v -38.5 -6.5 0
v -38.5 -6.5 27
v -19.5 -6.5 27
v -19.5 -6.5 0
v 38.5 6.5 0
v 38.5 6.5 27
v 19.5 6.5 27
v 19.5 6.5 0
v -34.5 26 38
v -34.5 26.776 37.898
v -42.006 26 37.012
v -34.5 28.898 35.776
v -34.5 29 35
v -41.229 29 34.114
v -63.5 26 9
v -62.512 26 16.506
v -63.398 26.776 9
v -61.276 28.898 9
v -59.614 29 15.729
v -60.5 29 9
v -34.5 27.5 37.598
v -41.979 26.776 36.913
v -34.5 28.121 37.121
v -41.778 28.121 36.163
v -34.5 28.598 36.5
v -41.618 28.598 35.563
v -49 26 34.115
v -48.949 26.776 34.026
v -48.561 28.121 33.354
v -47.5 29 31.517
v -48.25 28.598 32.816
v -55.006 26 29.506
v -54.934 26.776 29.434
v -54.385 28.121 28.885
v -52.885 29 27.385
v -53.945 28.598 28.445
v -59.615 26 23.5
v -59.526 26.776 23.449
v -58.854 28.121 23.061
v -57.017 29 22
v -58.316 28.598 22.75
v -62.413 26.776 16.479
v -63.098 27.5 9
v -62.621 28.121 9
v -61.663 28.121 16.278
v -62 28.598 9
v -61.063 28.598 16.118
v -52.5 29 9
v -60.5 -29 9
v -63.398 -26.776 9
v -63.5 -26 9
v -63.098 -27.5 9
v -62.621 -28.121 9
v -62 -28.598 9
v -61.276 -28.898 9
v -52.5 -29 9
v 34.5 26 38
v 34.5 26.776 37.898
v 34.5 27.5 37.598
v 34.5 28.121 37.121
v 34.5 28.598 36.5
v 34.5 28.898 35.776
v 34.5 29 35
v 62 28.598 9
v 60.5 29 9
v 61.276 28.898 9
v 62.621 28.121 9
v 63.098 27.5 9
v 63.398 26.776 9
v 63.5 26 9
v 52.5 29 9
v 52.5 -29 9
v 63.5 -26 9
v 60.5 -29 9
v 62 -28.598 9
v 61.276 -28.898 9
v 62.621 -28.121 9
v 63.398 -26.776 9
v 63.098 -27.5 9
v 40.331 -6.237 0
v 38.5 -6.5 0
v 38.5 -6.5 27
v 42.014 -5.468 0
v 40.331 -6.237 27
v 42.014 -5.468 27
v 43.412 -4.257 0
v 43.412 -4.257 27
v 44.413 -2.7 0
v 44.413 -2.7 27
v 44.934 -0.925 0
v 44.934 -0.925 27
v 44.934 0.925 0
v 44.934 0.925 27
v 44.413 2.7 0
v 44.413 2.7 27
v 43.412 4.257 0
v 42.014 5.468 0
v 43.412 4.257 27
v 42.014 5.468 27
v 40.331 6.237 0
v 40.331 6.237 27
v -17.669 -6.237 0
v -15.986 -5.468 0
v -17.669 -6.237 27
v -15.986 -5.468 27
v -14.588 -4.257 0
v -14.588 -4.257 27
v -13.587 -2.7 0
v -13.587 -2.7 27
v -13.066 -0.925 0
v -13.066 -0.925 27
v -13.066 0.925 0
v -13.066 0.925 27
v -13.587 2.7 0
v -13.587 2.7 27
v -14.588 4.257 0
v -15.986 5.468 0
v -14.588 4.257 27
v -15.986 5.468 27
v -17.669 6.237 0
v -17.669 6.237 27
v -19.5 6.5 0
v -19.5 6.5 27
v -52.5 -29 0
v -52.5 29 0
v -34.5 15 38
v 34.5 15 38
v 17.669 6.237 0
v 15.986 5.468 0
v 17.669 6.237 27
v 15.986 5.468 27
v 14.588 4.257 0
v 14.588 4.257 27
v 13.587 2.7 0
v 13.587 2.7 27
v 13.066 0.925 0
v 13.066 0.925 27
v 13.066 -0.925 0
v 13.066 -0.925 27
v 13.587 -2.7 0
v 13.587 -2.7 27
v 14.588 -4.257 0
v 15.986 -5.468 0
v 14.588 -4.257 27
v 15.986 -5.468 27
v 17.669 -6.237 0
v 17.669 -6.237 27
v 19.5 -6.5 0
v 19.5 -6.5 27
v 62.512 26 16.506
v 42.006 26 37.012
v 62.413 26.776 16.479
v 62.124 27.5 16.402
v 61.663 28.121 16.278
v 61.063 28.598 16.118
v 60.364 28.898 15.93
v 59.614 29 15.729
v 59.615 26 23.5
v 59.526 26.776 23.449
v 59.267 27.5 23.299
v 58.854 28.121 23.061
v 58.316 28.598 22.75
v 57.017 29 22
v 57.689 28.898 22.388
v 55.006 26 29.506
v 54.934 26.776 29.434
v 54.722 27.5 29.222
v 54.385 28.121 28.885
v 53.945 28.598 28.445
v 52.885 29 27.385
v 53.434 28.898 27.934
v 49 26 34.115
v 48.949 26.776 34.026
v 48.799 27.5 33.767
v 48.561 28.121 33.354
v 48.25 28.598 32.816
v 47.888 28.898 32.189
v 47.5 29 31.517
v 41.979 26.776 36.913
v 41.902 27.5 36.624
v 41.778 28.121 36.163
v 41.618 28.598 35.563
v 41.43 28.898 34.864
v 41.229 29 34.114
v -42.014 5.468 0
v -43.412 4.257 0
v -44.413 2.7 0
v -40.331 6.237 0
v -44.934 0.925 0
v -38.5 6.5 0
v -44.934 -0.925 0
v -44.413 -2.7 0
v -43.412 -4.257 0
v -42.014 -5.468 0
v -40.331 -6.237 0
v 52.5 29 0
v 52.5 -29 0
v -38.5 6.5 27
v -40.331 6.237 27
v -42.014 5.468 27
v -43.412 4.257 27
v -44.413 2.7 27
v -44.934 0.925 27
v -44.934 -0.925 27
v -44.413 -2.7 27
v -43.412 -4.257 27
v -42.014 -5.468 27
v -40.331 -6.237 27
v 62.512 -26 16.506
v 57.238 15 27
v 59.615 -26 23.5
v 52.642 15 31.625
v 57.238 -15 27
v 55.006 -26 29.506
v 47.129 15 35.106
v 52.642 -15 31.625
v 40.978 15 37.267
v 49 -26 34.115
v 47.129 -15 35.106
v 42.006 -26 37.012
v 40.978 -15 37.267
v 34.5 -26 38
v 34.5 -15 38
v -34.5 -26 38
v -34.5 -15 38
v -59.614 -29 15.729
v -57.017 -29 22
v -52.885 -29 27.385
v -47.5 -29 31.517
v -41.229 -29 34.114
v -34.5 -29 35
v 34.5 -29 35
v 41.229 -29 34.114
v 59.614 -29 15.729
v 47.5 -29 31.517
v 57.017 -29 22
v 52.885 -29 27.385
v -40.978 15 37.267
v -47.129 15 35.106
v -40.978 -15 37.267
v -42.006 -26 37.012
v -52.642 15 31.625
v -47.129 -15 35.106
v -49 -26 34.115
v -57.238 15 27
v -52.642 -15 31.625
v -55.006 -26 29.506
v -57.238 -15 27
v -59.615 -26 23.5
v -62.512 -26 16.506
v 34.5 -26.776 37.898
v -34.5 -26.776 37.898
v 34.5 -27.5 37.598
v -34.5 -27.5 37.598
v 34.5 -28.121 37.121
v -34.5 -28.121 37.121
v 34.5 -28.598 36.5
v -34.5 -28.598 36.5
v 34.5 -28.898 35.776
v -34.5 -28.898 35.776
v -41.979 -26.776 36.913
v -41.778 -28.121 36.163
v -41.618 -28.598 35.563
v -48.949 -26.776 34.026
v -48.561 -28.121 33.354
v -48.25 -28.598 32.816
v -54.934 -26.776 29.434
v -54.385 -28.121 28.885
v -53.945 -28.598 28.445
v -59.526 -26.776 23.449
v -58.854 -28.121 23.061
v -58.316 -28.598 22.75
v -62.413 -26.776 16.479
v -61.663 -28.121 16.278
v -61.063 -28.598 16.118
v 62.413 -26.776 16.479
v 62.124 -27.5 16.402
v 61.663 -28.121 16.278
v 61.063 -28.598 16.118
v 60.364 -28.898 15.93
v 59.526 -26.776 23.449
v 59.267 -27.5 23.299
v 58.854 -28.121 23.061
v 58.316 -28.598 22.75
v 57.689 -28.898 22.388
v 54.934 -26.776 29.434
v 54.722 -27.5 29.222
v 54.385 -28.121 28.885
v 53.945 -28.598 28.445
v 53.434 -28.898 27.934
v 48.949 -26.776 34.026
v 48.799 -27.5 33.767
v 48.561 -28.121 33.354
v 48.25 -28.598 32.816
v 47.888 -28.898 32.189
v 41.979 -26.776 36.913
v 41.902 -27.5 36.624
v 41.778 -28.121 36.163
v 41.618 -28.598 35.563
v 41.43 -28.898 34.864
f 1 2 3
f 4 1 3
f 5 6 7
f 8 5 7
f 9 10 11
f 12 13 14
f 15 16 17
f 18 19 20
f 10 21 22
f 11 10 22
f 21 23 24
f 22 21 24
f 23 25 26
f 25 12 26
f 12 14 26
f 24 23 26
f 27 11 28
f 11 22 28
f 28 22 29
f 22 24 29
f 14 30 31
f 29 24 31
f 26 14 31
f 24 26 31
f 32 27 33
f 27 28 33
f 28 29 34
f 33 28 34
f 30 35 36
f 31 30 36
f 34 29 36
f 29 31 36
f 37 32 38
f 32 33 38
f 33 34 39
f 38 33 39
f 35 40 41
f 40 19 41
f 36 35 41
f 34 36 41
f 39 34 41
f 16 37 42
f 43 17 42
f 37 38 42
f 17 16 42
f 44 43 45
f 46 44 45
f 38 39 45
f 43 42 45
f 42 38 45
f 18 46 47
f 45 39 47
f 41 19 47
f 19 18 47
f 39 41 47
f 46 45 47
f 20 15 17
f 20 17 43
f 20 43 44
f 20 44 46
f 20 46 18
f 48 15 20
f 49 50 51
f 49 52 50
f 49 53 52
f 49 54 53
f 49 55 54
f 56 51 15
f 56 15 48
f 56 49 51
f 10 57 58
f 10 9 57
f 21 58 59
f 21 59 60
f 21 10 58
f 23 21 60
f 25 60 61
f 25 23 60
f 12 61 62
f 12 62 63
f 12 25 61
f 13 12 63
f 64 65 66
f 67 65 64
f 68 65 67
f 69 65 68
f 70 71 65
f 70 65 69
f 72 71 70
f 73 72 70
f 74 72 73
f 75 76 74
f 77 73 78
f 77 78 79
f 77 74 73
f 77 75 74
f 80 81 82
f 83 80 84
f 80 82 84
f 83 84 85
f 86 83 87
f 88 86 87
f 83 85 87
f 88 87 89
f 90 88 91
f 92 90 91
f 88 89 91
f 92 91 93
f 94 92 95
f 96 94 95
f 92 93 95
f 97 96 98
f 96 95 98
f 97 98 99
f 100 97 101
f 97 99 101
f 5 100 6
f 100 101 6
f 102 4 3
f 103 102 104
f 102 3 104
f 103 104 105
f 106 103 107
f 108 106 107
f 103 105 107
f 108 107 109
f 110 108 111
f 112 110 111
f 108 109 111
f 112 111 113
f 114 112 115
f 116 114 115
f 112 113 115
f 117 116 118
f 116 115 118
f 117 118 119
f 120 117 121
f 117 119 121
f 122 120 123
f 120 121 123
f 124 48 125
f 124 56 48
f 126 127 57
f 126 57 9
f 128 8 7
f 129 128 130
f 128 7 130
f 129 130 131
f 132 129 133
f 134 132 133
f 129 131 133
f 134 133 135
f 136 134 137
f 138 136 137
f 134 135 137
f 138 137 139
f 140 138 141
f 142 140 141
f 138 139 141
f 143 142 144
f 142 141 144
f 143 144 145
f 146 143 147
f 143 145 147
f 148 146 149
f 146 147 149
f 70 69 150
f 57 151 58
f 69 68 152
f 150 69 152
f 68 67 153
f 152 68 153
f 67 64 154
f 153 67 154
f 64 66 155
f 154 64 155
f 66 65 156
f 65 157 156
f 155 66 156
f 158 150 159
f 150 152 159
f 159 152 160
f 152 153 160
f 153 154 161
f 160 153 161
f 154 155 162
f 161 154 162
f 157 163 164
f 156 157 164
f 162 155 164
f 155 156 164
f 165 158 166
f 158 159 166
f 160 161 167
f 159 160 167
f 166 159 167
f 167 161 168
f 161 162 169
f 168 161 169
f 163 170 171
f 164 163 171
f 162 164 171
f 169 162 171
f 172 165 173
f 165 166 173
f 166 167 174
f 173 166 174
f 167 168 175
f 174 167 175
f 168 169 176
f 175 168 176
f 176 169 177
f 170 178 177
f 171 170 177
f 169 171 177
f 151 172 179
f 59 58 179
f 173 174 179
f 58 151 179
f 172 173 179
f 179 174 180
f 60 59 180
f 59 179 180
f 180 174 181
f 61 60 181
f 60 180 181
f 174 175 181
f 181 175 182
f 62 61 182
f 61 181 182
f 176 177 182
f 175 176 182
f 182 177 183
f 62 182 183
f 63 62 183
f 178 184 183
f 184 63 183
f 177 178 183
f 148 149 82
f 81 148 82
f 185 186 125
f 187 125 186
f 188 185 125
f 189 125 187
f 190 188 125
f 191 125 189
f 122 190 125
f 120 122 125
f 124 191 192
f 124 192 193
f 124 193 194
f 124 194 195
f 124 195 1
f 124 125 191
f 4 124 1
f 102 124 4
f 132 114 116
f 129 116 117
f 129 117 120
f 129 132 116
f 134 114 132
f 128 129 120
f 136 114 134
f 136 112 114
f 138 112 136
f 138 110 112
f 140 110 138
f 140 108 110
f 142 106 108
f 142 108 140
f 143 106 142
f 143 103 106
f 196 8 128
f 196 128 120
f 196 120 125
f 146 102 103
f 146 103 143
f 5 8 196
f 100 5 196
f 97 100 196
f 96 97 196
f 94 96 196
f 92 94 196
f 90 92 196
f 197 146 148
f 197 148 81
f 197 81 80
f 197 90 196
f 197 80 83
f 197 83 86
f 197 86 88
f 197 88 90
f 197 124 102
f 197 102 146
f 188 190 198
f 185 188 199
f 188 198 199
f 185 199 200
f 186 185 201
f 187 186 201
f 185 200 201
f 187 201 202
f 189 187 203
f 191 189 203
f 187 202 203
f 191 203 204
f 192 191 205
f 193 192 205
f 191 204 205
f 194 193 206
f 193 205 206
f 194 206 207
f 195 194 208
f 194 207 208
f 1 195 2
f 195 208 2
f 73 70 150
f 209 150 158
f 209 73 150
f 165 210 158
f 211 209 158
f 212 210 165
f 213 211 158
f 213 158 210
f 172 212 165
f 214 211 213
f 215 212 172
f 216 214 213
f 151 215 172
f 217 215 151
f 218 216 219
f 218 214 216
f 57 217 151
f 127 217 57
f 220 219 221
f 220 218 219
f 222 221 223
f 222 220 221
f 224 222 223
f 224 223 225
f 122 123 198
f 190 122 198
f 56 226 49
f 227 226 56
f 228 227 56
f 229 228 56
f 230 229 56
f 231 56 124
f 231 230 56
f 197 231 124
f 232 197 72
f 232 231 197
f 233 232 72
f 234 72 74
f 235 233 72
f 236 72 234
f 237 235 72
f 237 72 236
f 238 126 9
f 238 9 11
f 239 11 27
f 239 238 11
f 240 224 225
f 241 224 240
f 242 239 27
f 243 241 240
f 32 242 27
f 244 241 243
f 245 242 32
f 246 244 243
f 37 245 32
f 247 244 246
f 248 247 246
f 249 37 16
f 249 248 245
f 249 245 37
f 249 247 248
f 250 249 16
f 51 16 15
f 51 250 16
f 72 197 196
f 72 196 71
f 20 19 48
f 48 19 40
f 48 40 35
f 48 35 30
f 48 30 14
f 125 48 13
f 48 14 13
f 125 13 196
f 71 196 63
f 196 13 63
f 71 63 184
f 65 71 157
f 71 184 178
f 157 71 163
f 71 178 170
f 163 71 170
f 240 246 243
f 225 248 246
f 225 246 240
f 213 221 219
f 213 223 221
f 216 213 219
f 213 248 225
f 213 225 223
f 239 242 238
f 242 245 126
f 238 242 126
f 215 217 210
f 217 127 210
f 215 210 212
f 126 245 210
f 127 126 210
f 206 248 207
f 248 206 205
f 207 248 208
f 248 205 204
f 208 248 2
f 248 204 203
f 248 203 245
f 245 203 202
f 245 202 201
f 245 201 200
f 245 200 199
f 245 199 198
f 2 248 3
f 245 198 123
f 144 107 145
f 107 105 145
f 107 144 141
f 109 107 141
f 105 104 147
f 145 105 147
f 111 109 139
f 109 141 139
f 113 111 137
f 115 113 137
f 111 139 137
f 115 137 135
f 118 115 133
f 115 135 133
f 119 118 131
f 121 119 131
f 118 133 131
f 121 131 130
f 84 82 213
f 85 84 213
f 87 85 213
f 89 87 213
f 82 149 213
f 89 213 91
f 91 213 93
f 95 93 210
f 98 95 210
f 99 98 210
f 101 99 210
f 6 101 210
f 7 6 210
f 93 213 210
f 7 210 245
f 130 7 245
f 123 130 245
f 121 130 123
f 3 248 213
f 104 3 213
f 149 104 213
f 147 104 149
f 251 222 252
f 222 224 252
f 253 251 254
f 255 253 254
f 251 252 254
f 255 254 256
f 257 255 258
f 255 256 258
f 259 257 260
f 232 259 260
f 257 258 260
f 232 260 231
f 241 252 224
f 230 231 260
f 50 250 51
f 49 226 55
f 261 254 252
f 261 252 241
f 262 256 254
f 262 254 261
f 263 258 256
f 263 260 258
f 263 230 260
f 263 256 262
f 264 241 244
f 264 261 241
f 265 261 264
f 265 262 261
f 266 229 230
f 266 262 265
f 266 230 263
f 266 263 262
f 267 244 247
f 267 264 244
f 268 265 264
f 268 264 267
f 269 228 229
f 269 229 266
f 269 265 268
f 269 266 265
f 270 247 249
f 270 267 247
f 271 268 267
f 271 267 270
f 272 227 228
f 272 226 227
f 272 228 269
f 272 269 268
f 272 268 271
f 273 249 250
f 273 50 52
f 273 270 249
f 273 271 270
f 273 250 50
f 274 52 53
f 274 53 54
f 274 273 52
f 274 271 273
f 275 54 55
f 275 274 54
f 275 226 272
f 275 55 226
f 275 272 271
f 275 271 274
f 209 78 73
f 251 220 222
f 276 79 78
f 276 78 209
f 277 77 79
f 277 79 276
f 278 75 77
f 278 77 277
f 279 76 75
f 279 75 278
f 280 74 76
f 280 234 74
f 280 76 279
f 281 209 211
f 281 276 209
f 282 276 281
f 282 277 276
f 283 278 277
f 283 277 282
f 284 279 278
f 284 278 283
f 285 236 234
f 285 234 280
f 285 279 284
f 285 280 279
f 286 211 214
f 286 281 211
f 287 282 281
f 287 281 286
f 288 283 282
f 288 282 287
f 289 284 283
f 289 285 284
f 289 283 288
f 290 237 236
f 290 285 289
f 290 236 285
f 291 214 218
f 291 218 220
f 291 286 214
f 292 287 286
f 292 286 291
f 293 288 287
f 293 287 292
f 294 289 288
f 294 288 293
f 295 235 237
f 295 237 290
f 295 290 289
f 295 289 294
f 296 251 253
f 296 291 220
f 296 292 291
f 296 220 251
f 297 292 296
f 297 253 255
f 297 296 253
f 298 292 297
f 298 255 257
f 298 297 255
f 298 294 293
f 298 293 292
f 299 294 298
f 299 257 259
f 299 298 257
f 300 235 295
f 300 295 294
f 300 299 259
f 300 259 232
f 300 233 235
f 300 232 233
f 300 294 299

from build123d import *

# Parameters (mm, degrees)
F1_DEPTH      = 29
F2_R          = 3
F3_W          = 30
F3_H          = 11
F4_DEPTH      = 63.5010001
F4_DEPTH_BACK = 63.5010001
F6_DEPTH      = 27.001


with BuildPart() as f1:
    # F0 (on Front) → F1 (new body, symmetric)
    with BuildSketch(Plane.XZ):
        with BuildLine():
            Line((-52.5, 0), (52.5, 0))
            Line((52.5, 0), (52.5, 9))
            Line((52.5, 9), (63.5, 9))
            ThreePointArc((63.5, 9), (55.0060966544, 29.5060966544), (34.5, 38))
            Line((34.5, 38), (-34.5, 38))
            ThreePointArc((-34.5, 38), (-55.0060966544, 29.5060966544), (-63.5, 9))
            Line((-63.5, 9), (-52.5, 9))
            Line((-52.5, 9), (-52.5, 0))
        make_face()
    extrude(amount=F1_DEPTH, both=True)

    # F2
    f2_edges = [f1.edges().sort_by_distance(p)[0] for p in [
        (0, -29, 38),
        (0, 29, 38),
    ]]
    fillet(f2_edges, radius=F2_R)

    # F3 (on Right) → F4 (cut, two sides)
    with BuildSketch(Plane.YZ) as f4_sk:
        with Locations((0, 32.5)):
            Rectangle(F3_W, F3_H)
    extrude(amount=-F4_DEPTH, mode=Mode.SUBTRACT)
    extrude(f4_sk.sketch, amount=F4_DEPTH_BACK, mode=Mode.SUBTRACT)

    # F5 (on face) → F6 (cut, through all)
    with BuildSketch(Plane.XY.offset(27)):
        with BuildLine():
            Line((-19.5, 6.5), (-38.5, 6.5))
            ThreePointArc((-38.5, 6.5), (-45, 0), (-38.5, -6.5))
            Line((-38.5, -6.5), (-19.5, -6.5))
            ThreePointArc((-19.5, -6.5), (-13, 0), (-19.5, 6.5))
        make_face()
        with BuildLine():
            Line((38.5, 6.5), (19.5, 6.5))
            ThreePointArc((19.5, 6.5), (13, 0), (19.5, -6.5))
            Line((19.5, -6.5), (38.5, -6.5))
            ThreePointArc((38.5, -6.5), (45, 0), (38.5, 6.5))
        make_face()
    extrude(amount=-F6_DEPTH, mode=Mode.SUBTRACT)


solid = f1.part
